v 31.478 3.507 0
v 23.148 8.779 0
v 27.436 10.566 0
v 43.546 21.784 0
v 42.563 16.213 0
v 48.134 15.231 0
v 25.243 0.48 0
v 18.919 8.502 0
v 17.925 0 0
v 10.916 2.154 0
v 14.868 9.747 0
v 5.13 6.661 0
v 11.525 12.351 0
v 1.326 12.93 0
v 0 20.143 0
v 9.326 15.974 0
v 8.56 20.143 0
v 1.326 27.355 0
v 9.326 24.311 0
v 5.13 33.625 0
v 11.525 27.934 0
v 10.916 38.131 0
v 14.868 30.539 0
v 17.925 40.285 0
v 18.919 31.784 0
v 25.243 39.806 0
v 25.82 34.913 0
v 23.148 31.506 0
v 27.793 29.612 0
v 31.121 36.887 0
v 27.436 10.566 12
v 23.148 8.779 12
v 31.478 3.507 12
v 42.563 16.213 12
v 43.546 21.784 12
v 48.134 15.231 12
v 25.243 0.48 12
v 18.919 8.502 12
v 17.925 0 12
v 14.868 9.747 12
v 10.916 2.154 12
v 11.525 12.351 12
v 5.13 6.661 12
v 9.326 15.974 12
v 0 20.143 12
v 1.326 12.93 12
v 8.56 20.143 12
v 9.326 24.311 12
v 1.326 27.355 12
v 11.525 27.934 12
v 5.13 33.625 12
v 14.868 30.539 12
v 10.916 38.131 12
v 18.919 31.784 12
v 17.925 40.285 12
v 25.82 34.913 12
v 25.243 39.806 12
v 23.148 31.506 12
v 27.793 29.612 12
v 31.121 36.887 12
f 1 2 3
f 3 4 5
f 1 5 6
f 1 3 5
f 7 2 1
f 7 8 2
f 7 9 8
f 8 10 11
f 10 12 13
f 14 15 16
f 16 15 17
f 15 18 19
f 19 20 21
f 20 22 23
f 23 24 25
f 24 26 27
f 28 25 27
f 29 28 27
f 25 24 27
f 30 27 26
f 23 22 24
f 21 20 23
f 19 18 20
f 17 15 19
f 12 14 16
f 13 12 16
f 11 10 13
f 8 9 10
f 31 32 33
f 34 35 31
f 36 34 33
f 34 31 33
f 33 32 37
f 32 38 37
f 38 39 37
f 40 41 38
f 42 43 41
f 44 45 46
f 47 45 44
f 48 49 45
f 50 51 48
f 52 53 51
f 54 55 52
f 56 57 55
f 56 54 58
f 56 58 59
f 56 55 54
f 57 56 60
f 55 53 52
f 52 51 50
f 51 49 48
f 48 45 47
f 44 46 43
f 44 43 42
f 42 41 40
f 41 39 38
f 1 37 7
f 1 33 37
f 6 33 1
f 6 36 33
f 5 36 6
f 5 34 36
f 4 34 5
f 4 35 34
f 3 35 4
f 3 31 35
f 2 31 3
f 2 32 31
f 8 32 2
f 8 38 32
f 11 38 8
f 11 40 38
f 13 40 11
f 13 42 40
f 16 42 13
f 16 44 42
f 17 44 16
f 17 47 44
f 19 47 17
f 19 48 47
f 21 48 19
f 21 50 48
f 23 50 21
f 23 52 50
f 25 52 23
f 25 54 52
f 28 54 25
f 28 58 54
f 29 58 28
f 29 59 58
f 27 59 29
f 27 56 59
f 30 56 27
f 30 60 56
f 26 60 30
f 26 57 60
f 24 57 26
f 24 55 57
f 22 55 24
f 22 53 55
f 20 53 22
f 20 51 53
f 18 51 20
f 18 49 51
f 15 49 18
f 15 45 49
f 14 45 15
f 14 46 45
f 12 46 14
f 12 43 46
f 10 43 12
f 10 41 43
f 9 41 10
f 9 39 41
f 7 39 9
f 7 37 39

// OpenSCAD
$fn = 32;

// ----------------------------------------------------------------------
// Eye lug: ring_tail, 12 mm thick
// ----------------------------------------------------------------------

// --- parameters (mm) ---
profile_height = 12;      // extrusion height
profile_points = 30;      // points of the closed outline

profile = [[25.82, 34.913], [31.121, 36.887], [25.243, 39.806], [17.925, 40.285], [10.916, 38.131], [5.13, 33.625], [1.326, 27.355], [0, 20.143], [1.326, 12.93], [5.13, 6.661], [10.916, 2.154], [17.925, 0], [25.243, 0.48], [31.478, 3.507], [48.134, 15.231], [42.563, 16.213], [43.546, 21.784], [27.436, 10.566], [23.148, 8.779], [18.919, 8.502], [14.868, 9.747], [11.525, 12.351], [9.326, 15.974], [8.56, 20.143], [9.326, 24.311], [11.525, 27.934], [14.868, 30.539], [18.919, 31.784], [23.148, 31.506], [27.793, 29.612]];  // single closed polygon, 30 points, counter clockwise

// --- the one profile operation ---
linear_extrude(height = profile_height) polygon(points = profile);
